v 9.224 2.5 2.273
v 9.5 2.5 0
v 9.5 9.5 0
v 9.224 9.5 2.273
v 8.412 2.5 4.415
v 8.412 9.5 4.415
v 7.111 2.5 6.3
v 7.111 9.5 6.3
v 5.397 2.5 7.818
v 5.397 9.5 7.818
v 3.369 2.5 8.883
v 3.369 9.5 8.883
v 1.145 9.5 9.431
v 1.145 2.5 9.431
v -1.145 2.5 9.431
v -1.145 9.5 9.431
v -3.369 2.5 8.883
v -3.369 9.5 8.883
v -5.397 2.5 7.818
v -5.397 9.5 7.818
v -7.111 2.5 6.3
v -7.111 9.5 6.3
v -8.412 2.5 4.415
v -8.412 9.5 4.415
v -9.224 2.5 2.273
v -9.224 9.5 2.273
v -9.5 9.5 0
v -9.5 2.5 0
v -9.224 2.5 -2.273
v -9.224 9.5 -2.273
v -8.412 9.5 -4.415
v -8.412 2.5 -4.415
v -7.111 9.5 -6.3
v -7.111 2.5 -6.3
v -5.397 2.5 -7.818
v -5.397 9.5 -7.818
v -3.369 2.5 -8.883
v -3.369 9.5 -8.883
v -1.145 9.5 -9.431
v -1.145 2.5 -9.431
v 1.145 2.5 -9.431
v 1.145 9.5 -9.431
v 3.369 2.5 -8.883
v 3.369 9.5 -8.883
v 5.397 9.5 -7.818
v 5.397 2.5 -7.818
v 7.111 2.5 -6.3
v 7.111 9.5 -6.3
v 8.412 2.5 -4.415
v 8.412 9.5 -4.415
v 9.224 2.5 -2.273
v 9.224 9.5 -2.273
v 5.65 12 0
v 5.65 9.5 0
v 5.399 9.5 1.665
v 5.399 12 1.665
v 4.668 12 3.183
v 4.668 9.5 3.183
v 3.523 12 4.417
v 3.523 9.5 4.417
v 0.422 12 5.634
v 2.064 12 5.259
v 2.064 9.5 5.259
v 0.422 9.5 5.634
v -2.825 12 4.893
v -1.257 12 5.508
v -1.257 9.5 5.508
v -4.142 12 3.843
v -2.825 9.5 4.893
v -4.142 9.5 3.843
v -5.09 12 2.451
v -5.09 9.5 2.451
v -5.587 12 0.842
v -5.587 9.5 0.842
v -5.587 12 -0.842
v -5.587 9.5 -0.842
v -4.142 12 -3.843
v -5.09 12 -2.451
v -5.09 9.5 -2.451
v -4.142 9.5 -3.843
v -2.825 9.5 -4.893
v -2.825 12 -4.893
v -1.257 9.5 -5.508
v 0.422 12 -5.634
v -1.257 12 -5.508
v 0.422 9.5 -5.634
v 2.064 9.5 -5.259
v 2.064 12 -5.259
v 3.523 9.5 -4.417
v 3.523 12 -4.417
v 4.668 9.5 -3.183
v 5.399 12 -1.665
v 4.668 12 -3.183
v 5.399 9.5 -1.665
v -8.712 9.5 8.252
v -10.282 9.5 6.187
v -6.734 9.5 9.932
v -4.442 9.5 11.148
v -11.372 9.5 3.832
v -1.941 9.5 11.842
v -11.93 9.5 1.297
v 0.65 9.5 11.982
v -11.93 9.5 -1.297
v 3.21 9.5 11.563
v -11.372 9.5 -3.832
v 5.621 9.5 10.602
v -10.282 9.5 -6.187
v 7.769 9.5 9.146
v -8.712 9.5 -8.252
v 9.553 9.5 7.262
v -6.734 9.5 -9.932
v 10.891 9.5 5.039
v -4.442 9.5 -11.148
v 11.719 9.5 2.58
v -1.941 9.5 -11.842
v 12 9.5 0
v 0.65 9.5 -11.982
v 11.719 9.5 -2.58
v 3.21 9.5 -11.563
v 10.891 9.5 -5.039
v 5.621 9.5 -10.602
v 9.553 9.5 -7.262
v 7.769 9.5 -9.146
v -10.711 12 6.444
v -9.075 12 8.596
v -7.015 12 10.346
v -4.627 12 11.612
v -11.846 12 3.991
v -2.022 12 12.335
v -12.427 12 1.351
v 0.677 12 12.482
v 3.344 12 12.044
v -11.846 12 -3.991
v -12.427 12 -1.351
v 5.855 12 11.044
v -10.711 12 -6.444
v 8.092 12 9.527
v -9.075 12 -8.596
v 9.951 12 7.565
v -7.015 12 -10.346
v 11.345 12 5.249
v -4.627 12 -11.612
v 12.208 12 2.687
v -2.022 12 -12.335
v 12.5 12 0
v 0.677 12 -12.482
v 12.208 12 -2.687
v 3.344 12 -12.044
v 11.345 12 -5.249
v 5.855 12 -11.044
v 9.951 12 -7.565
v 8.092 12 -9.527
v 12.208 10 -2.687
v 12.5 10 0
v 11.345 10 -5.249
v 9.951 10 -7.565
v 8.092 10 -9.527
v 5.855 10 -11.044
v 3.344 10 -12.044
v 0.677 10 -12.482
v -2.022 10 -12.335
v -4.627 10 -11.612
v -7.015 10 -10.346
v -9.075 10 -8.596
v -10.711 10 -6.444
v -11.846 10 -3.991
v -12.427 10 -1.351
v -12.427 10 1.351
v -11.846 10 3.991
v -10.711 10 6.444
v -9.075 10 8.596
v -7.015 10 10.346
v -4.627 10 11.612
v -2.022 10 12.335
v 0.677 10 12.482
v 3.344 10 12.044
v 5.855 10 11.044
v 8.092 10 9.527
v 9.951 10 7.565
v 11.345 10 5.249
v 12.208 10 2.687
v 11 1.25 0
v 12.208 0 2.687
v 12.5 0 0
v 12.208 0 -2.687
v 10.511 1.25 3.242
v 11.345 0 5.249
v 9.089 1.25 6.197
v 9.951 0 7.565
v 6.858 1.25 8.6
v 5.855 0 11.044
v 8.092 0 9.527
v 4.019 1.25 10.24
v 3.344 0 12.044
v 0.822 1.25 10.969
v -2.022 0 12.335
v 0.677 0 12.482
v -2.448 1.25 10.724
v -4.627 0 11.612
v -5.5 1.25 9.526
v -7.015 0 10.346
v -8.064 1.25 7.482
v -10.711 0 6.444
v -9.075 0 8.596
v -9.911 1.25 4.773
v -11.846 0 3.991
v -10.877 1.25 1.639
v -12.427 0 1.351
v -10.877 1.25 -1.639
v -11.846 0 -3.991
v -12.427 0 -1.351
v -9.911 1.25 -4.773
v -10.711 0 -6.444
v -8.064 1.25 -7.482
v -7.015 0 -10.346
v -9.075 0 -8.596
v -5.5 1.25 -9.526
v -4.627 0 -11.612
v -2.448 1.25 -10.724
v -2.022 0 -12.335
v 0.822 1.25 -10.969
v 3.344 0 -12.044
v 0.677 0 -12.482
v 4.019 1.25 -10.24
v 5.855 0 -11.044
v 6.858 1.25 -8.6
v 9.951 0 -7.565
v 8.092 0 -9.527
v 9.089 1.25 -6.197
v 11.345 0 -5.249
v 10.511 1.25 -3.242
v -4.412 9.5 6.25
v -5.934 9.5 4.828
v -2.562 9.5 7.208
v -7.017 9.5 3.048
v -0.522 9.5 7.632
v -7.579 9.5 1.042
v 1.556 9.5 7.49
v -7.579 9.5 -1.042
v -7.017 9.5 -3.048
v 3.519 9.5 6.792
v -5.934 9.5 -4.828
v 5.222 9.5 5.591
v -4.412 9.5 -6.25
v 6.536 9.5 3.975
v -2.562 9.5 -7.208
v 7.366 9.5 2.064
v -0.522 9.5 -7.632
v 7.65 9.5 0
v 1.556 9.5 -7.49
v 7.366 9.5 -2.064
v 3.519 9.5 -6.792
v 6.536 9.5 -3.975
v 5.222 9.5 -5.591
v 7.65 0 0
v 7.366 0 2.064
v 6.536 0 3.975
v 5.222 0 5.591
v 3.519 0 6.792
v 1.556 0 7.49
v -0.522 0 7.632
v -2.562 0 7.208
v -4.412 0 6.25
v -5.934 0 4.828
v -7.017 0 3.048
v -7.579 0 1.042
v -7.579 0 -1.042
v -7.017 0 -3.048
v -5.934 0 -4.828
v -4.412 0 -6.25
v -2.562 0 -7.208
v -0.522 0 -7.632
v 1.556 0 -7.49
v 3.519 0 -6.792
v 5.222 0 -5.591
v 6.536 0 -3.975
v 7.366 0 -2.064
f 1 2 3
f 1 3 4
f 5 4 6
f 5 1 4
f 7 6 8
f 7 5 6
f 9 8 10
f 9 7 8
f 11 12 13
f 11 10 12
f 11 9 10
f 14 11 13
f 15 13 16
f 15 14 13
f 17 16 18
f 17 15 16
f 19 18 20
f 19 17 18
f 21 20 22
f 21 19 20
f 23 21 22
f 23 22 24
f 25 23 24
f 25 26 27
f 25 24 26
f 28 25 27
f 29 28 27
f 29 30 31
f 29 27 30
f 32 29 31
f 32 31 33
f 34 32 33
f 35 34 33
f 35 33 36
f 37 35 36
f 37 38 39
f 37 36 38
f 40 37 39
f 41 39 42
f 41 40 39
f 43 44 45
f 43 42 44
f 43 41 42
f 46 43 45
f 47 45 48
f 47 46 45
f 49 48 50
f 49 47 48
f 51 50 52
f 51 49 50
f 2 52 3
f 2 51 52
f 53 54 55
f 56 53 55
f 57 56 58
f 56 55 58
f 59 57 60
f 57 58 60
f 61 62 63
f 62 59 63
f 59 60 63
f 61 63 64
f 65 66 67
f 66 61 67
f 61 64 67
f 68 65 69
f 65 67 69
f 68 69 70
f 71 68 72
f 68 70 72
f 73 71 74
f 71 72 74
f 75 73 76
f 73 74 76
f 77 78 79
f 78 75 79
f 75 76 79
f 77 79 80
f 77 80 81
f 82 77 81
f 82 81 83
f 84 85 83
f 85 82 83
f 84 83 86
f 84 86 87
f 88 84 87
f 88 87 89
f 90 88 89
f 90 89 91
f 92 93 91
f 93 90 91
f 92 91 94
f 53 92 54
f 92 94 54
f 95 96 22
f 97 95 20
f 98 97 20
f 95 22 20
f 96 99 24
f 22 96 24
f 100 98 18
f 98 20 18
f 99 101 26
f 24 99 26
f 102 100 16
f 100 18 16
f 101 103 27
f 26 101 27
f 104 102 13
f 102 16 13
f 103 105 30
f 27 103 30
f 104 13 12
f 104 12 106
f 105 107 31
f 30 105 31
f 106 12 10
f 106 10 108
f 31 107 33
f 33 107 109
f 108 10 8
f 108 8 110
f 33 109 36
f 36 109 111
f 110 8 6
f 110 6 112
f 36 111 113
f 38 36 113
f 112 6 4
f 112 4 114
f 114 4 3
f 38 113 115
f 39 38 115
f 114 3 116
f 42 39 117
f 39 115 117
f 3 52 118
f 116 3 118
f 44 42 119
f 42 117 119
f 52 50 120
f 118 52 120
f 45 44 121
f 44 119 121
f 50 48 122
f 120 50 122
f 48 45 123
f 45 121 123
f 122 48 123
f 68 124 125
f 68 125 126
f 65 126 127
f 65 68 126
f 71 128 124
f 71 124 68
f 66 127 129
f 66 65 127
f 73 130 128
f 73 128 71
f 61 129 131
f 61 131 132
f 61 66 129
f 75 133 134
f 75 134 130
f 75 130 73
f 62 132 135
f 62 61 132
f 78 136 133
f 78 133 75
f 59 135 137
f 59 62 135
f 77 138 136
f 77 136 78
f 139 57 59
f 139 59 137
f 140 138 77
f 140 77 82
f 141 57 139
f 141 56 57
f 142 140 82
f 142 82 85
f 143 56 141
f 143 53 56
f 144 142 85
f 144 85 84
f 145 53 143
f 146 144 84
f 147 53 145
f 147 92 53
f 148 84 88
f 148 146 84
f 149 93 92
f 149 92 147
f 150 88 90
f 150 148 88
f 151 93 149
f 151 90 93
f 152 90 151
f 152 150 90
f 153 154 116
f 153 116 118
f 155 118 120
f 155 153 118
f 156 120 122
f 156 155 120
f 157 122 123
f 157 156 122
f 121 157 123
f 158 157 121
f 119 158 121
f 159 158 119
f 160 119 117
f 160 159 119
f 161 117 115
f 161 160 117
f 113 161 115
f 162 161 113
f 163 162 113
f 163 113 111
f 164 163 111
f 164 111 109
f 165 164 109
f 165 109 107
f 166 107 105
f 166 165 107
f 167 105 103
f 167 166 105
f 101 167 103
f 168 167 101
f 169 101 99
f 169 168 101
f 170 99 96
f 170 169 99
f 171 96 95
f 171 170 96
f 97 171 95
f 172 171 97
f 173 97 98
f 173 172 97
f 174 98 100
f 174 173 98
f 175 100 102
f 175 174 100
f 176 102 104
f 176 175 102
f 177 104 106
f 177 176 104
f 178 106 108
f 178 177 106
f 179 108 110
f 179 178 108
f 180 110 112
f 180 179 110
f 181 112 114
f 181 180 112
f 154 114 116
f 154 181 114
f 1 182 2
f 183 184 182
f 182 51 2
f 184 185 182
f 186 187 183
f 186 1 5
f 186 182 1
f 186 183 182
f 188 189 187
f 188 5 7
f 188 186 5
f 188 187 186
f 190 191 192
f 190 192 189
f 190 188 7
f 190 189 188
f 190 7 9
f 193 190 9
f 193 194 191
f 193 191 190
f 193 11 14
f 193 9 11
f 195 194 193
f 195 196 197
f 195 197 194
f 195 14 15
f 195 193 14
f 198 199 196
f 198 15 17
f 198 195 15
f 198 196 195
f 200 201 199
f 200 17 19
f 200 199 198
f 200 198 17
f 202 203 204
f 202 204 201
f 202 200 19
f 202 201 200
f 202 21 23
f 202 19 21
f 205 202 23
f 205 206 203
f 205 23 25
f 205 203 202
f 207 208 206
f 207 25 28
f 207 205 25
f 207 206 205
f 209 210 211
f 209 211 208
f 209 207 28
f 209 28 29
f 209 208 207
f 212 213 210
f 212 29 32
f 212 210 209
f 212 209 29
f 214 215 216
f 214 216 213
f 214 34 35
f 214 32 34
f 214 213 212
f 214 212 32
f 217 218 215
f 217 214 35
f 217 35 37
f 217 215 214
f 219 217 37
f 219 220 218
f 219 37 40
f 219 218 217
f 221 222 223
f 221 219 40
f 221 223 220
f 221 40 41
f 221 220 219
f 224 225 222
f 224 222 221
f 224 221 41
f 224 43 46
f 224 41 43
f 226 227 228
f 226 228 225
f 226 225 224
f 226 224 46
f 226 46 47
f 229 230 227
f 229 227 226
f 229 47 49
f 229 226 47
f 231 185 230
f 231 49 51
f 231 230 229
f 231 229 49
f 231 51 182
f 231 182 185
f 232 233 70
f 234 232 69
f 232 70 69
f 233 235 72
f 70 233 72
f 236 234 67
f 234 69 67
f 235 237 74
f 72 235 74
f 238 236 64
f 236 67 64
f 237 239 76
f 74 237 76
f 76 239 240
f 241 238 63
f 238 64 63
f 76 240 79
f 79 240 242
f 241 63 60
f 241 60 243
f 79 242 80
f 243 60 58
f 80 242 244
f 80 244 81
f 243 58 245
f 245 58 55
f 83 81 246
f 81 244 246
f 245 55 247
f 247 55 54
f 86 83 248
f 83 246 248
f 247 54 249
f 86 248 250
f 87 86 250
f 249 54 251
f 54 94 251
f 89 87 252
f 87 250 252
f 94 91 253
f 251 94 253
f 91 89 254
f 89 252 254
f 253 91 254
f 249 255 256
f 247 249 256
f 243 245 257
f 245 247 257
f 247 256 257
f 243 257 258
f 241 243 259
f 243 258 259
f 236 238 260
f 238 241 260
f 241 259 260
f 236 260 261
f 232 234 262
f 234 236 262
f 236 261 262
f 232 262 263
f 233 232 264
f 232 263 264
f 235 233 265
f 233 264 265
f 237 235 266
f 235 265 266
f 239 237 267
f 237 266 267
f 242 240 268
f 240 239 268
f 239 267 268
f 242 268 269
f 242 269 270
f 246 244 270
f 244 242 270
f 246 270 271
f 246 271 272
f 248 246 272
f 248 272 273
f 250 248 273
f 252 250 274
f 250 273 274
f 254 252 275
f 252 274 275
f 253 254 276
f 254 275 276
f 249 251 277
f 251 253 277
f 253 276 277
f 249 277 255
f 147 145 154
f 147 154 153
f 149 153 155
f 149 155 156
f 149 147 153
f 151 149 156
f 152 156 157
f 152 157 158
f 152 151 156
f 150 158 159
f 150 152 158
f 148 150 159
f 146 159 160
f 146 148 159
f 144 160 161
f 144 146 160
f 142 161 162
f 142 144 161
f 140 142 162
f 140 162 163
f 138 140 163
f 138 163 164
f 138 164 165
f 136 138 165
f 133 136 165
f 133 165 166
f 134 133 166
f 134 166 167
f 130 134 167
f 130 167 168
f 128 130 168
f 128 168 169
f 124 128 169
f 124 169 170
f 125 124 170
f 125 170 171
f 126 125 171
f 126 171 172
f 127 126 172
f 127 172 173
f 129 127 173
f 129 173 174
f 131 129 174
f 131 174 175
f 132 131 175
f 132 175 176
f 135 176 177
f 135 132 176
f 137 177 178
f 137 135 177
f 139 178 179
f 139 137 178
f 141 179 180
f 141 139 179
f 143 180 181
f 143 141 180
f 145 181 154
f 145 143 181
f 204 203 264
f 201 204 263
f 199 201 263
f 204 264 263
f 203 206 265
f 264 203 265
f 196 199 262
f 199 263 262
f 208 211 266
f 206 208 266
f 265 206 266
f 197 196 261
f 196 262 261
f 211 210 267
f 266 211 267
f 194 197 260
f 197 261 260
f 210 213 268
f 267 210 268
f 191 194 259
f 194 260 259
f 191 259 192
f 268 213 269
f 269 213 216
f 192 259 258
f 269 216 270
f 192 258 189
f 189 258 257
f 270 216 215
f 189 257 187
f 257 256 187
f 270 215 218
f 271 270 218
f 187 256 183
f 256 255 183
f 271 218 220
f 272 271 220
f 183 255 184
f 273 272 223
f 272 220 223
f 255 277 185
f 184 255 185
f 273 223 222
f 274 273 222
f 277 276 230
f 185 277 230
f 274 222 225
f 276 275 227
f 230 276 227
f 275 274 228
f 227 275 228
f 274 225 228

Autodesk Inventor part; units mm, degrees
ref_plane "YZ Plane" through (0, 0, 0) normal (1, 0, 0) x (0, 1, 0)
ref_plane "XZ Plane" through (0, 0, 0) normal (0, 1, 0) x (-1, 0, 0)
ref_plane "XY Plane" through (0, 0, 0) normal (0, 0, 1) x (1, 0, 0)
sketch "Sketch1" plane through (0, 0, 0) normal (0, 0, 1) x (1, 0, 0)
  line L0 (7.65, 0) -> (12.5, 0)
  line L1 (12.5, 0) -> (12.5, 12) construction
  line L2 (12.5, 12) -> (7.65, 12)
  line L3 (7.65, 12) -> (7.65, 0)
  line L4 (0, 0) -> (0, 8.5122) construction
  line L5 (9.5, 9.5) -> (9.5, 2.5)
  line L6 (9.5, 9.5) -> (12, 9.5)
  line L7 (12, 9.5) -> (12.5, 10)
  line L8 (12.5, 0) -> (9.5, 2.5)
  line L9 (12.5, 10) -> (12.5, 12)
  line L10 (7.65, 12) -> (5.65, 12)
  line L11 (5.65, 12) -> (5.65, 9.5)
  line L12 (5.65, 9.5) -> (7.65, 9.5)
  line L13 (7.65, 9.5) -> (7.65, 12)
  point P0 (12.5, 0.6699)
  point P1 (12.5, 6)
  point P2 (15.2143, 7.5754)
  point P3 (15.2143, 2.4246)
  point P4 (9.5, 6)
  point P5 (17.7886, 0.302)
  point P6 (7.65, 6)
  dimension "d6" = 12
  dimension "d7" = 7.65
  dimension "d17" = 7
  dimension "d18" = 2.5
  dimension "d19" = 135
  dimension "d20" = 3
  dimension "d21" = 2
  dimension "d22" = 2.5
  dimension "d23" = 12.5
revolve "Revolution1" add sketch "Sketch1" angle 360 about axis through (0, 0, 0) along (0, 1, 0)
properties part number "pully 15mmx25mmx12mm"
